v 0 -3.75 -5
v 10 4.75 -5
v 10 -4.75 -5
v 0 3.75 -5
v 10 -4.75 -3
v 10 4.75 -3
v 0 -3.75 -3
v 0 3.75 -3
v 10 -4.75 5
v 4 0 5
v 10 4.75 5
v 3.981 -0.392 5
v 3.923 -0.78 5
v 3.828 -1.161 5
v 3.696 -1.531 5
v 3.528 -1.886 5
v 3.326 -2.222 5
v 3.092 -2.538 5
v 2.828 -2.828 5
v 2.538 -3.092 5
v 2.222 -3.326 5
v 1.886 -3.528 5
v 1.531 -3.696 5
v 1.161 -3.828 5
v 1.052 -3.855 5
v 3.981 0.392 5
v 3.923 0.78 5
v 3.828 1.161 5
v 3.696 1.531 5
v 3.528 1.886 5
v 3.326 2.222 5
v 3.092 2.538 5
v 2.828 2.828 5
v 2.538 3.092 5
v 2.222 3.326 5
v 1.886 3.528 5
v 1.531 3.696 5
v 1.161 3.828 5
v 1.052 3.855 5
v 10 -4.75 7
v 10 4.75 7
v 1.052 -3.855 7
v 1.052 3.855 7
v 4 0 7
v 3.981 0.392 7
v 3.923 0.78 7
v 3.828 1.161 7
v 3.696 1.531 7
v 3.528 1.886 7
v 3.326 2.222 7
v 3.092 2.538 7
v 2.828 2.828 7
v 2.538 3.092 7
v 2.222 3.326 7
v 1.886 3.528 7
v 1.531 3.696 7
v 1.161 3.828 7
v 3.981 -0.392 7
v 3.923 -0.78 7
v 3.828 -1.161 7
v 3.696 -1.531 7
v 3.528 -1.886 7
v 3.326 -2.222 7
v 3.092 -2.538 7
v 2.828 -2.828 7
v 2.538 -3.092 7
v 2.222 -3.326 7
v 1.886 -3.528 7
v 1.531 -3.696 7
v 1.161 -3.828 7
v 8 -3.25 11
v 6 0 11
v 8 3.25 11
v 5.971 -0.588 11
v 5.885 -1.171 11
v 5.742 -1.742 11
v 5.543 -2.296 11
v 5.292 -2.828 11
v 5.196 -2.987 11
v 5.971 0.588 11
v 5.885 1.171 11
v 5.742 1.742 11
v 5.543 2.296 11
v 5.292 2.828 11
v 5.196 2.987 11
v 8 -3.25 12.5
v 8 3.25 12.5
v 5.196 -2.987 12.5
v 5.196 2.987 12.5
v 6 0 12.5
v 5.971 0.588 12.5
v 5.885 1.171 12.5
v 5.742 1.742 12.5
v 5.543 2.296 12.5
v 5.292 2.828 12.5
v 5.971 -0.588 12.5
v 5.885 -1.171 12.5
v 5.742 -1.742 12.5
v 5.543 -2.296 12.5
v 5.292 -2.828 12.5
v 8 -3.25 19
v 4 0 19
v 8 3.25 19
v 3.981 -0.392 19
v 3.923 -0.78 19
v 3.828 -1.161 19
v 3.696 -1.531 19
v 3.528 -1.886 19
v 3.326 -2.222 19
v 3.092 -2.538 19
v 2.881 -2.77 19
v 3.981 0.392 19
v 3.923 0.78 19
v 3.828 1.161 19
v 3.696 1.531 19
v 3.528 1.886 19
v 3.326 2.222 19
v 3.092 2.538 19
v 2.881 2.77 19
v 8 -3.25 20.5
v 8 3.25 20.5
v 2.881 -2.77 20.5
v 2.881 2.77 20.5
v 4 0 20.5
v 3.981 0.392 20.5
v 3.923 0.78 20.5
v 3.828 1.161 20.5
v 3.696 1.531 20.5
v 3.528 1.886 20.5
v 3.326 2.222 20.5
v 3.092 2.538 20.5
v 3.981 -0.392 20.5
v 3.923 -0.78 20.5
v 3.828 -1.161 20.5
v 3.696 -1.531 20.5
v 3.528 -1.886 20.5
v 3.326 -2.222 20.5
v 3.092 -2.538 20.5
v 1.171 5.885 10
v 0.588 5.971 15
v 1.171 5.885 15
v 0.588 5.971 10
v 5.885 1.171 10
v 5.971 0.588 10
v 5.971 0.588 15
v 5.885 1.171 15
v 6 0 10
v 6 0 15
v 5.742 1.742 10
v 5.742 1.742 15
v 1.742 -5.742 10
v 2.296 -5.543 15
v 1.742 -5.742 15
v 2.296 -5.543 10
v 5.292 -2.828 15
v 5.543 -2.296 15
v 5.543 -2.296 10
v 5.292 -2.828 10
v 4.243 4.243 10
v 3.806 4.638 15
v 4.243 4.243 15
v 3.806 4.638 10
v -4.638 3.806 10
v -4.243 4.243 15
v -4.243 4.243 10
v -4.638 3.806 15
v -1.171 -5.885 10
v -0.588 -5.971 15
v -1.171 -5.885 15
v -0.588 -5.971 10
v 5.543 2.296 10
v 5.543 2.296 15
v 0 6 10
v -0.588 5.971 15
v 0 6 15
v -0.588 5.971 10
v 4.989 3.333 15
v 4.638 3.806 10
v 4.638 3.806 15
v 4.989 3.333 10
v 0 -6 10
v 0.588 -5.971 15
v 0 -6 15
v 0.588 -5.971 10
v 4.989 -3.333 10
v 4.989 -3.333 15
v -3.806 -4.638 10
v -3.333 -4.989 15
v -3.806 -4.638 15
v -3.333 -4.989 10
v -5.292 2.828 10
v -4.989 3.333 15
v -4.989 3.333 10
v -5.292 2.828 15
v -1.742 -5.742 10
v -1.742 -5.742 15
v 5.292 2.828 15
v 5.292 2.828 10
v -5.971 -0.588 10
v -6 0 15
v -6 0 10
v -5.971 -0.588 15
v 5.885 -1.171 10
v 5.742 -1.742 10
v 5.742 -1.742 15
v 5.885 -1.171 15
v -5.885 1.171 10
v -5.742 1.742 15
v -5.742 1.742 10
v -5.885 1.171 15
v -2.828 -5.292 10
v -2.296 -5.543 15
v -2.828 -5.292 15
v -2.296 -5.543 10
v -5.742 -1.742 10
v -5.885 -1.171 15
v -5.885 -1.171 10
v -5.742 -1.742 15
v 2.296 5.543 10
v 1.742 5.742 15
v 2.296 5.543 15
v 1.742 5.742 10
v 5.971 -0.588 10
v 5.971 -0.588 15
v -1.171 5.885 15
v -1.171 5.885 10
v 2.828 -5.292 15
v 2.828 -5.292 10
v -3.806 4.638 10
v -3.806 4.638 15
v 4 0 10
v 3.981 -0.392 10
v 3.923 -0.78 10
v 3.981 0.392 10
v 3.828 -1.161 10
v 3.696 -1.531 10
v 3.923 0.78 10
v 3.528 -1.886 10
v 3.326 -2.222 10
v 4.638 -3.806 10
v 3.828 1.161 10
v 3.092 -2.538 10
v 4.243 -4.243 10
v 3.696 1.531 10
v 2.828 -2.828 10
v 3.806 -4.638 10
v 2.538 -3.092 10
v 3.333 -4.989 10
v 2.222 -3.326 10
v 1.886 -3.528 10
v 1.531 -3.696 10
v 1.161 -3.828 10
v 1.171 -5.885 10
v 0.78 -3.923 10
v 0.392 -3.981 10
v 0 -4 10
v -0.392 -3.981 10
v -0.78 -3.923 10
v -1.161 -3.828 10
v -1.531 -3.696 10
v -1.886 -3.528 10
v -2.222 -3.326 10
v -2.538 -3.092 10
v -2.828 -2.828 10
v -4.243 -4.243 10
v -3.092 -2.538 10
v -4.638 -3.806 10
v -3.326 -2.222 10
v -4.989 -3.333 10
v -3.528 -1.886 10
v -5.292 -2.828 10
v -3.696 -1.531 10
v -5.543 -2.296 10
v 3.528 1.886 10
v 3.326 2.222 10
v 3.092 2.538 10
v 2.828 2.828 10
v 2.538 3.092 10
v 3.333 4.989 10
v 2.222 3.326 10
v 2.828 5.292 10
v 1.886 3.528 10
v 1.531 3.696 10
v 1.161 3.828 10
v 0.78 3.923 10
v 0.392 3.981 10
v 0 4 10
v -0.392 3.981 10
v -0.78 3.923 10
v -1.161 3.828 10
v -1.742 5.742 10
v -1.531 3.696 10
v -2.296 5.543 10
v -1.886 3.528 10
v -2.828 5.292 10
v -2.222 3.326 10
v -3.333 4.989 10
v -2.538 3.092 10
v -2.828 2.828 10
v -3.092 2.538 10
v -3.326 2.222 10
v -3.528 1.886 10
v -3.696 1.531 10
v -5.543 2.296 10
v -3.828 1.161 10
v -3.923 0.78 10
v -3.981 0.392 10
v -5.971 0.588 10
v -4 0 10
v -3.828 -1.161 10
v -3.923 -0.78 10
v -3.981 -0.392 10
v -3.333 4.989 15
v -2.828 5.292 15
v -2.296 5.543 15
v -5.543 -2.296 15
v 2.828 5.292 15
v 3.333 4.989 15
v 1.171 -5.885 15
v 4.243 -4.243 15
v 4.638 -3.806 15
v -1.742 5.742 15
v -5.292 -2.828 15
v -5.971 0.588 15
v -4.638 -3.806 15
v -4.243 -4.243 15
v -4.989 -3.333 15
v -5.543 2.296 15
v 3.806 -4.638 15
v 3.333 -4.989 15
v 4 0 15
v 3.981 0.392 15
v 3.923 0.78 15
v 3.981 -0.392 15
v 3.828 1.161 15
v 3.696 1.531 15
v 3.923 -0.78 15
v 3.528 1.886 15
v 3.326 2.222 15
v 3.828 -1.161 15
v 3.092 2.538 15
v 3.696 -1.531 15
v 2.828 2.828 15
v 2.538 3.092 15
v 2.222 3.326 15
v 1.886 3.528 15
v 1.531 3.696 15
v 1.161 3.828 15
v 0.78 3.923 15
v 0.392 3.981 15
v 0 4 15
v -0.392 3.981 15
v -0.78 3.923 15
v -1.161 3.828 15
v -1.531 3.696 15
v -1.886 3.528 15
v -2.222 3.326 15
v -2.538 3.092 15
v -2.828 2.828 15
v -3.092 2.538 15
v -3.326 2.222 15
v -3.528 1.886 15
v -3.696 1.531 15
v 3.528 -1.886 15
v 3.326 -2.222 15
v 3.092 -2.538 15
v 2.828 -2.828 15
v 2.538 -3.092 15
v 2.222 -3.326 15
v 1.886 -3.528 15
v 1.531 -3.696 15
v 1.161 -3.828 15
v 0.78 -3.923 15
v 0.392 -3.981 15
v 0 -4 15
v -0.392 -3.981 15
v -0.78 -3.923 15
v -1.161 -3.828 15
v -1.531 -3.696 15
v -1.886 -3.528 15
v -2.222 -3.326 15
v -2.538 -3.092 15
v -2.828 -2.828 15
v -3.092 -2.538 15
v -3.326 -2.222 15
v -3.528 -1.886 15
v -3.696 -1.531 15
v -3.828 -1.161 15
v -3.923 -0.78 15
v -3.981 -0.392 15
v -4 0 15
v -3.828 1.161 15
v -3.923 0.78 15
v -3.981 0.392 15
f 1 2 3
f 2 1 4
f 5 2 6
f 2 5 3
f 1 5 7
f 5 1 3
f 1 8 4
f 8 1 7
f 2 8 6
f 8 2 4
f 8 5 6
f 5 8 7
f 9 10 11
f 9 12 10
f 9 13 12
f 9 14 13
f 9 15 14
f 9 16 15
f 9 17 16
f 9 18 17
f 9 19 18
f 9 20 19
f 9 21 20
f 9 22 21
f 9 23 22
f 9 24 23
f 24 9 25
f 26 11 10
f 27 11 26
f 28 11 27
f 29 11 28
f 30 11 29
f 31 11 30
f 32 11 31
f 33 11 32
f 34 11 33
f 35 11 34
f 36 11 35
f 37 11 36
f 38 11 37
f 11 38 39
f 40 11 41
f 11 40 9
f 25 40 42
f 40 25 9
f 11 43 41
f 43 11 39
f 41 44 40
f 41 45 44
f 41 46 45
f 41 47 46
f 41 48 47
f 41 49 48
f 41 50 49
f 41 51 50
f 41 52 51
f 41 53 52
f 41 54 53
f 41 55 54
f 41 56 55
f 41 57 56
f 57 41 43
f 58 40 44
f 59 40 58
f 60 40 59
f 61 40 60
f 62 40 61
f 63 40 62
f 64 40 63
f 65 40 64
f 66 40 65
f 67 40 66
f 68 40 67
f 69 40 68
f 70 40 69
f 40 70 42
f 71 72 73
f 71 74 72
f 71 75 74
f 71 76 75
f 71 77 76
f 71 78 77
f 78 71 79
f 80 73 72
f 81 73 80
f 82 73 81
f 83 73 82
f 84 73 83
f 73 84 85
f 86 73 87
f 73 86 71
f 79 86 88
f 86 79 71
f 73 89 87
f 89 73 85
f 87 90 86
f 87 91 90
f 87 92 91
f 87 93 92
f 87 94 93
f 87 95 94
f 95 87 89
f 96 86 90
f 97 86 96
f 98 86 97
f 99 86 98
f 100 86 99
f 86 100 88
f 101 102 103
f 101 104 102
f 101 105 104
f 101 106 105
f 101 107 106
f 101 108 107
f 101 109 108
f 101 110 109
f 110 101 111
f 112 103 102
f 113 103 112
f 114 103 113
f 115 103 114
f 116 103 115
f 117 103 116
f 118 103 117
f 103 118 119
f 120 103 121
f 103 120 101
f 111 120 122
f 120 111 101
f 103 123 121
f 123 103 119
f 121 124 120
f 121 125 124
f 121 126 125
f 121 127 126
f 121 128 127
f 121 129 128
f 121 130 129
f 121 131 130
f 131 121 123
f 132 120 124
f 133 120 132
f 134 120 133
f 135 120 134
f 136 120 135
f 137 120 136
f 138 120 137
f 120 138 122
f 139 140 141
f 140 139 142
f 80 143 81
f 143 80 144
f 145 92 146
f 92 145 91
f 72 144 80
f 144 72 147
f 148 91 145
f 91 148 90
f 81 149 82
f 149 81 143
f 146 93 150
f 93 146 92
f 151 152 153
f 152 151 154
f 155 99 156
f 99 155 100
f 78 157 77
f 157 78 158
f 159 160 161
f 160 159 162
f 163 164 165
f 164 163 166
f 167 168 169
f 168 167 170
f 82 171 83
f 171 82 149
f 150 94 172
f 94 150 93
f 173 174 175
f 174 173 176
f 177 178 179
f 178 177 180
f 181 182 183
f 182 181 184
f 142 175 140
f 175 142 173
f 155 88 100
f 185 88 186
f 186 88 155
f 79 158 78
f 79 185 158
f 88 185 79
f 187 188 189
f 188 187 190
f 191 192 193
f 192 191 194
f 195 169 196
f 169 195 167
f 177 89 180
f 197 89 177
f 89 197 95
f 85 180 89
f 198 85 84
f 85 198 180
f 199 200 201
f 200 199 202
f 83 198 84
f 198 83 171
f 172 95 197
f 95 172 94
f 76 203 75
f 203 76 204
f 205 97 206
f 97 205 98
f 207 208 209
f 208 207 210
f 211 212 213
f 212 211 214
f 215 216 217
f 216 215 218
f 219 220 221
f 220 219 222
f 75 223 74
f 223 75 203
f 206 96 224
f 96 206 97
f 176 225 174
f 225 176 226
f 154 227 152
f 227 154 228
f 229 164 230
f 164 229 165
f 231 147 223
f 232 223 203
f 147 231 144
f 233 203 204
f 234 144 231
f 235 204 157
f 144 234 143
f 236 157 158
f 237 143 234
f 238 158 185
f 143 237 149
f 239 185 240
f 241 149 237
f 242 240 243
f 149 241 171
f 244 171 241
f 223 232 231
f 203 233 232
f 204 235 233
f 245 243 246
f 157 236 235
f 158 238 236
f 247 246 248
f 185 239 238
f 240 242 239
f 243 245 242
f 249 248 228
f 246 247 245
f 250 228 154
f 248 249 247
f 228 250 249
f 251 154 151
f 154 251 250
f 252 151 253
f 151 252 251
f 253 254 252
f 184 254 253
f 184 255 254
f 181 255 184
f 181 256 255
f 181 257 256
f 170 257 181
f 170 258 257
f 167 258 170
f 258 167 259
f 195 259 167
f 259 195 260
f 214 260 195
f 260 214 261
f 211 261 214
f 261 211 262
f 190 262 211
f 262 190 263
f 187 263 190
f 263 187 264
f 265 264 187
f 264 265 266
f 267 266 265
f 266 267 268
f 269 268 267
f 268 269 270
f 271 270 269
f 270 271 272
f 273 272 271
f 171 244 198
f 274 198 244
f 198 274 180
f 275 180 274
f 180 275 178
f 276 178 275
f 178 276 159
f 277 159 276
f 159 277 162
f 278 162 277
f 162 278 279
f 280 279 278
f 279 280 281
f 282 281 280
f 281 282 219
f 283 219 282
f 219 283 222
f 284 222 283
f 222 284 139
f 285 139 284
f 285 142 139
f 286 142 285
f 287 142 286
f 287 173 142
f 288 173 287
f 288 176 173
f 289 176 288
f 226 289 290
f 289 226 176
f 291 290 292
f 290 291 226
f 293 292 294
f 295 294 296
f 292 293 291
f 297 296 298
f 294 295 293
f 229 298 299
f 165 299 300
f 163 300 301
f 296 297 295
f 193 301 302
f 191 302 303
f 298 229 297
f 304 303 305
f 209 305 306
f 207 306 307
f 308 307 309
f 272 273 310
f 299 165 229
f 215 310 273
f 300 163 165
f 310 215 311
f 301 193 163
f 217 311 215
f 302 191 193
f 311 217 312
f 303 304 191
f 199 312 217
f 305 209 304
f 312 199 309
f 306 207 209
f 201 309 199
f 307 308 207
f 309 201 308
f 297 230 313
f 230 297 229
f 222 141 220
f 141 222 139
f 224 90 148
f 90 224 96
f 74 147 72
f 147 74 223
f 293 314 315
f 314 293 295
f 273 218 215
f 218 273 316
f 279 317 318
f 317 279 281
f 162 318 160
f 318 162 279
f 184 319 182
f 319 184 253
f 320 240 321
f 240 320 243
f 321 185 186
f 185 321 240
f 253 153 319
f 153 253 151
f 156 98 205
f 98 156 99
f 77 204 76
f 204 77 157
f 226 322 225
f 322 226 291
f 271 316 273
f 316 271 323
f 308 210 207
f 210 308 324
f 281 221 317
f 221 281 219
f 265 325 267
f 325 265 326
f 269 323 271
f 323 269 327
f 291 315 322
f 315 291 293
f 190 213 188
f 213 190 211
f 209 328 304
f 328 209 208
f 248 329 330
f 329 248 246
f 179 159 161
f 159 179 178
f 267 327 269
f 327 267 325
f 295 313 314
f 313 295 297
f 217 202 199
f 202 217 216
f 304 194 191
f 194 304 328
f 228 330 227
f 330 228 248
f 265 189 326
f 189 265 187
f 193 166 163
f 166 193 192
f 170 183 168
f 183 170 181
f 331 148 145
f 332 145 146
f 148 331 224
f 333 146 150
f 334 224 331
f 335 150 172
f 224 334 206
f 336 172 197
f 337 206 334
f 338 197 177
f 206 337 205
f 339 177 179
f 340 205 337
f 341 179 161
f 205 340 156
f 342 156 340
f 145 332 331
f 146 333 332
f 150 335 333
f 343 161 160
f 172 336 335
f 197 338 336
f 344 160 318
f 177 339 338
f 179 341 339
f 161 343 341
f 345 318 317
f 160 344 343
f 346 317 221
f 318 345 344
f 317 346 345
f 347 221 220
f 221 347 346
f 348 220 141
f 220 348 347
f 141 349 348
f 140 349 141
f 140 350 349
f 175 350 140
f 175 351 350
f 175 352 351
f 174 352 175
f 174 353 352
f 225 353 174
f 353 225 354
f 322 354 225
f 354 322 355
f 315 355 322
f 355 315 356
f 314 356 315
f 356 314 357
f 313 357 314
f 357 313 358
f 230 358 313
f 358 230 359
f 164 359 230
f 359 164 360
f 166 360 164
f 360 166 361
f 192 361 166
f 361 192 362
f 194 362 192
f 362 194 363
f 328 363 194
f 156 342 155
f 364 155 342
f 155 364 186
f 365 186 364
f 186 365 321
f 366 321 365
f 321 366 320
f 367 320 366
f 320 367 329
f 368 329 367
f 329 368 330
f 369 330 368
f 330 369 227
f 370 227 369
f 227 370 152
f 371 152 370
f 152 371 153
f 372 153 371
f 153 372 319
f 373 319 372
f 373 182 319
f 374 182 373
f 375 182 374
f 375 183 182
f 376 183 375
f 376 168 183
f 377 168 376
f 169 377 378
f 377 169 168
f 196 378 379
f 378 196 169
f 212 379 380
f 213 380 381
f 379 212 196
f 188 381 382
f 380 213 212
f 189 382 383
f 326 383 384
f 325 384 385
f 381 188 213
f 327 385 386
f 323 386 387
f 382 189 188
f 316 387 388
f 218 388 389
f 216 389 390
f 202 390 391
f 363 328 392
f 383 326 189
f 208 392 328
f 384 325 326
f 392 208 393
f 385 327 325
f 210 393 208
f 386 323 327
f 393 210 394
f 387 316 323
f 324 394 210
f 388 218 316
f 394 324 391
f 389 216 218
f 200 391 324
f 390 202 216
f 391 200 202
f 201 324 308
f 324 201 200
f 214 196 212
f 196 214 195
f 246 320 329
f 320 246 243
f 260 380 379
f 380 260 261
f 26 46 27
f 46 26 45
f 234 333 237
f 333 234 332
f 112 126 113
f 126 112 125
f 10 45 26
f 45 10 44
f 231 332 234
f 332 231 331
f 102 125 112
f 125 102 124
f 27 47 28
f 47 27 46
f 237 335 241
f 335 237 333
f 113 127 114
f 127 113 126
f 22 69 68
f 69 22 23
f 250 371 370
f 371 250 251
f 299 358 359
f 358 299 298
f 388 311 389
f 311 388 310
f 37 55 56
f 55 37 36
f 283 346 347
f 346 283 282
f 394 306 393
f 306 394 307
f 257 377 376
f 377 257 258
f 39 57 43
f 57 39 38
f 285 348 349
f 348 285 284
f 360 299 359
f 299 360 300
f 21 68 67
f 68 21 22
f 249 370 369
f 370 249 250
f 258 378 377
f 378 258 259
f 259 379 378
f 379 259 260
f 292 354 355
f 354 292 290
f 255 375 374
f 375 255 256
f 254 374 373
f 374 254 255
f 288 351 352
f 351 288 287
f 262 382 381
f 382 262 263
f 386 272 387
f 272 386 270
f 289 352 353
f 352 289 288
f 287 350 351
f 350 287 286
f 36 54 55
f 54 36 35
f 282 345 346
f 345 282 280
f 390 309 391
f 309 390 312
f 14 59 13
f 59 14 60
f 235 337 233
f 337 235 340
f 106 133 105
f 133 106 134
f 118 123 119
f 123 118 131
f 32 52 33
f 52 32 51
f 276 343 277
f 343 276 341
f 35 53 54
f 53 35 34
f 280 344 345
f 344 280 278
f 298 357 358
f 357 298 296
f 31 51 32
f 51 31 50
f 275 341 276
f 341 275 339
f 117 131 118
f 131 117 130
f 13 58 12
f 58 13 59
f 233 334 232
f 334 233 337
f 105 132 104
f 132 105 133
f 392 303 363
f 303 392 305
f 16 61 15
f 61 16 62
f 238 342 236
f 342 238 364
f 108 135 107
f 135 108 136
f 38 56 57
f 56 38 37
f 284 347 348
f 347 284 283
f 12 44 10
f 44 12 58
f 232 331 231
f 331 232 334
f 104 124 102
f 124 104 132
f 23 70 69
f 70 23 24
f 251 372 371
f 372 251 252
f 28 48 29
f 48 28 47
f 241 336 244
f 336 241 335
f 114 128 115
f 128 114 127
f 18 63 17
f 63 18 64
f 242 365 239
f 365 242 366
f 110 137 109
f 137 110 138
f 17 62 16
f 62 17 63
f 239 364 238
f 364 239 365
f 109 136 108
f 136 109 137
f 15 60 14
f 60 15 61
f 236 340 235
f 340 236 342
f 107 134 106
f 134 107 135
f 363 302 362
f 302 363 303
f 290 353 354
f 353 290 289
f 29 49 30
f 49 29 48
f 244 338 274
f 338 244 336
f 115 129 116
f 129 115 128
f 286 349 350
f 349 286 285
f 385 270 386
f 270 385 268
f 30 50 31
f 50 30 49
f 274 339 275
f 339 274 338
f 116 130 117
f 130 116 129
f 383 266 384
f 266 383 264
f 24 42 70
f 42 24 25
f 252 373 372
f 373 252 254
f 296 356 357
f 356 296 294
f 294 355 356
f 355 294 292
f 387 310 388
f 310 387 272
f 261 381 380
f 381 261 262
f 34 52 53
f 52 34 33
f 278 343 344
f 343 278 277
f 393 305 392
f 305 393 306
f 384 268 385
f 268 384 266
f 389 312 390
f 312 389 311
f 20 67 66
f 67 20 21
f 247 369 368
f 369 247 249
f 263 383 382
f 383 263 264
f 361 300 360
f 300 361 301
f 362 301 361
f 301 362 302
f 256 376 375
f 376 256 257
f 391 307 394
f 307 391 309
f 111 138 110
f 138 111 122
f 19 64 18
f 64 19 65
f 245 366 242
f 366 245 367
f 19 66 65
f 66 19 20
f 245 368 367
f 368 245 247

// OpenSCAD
// Straight hose-barb reducer: 8 mm tubing -> 5 mm tubing
// Print orientation: standing upright along +Z, centred on origin in X/Y

$fn = 64;

// ---- Dimensions (mm) ----
reducer_id     = 8;    // 8 mm tubing inner diameter (bore)
reducer_od     = 5;    // 5 mm tubing inner diameter (bore)
barb_h_8       = 10;   // height of each 8 mm barb
barb_od_8      = 9.5;  // outer diameter of 8 mm barb at top
barb_od_8_bot  = 7.5;  // outer diameter of 8 mm barb at bottom
barb_h_5       = 8;    // height of each 5 mm barb
barb_od_5      = 6.5;  // outer diameter of 5 mm barb at bottom
barb_od_5_top  = 5.0;  // outer diameter of 5 mm barb at top
collar_h       = 5;    // height of cylindrical collar (z = 20 to 25)
barb_h_total   = barb_h_8 + collar_h + barb_h_5; // 23 mm overall
eps            = 0.5;  // overshoot for clean boolean cuts

// ---- Model ----
difference() {
    union() {
        // 8 mm barbs: z = 0 to 20 (two stacked, identical)
        for (s = [-1, 1])
            translate([0, 0, s * barb_h_8 / 2])
                linear_extrude(height = barb_od_8 - barb_od_8_bot)
                    polygon([
                        [0, barb_od_8_bot / 2],
                        [0, -barb_od_8_bot / 2],
                        [barb_h_8, -barb_od_8 / 2],
                        [barb_h_8, barb_od_8 / 2]
                    ]);

        // Collar: z = 20 to 25
        translate([0, 0, barb_h_8])
            cylinder(h = collar_h, d = 12);

        // 5 mm barbs: z = 25 to 41 (two stacked, identical)
        for (s = [-1, 1])
            translate([0, 0, s * barb_h_5 / 2 + barb_h_8 + collar_h])
                linear_extrude(height = barb_od_5 - barb_od_5_top)
                    polygon([
                        [0, barb_od_5_top / 2],
                        [0, -barb_od_5_top / 2],
                        [barb_h_5, -barb_od_5 / 2],
                        [barb_h_5, barb_od_5 / 2]
                    ]);
    }

    // Straight bore through full length
    translate([0, 0, -eps])
        cylinder(h = barb_h_total + 2 * eps, d = reducer_id);
}
